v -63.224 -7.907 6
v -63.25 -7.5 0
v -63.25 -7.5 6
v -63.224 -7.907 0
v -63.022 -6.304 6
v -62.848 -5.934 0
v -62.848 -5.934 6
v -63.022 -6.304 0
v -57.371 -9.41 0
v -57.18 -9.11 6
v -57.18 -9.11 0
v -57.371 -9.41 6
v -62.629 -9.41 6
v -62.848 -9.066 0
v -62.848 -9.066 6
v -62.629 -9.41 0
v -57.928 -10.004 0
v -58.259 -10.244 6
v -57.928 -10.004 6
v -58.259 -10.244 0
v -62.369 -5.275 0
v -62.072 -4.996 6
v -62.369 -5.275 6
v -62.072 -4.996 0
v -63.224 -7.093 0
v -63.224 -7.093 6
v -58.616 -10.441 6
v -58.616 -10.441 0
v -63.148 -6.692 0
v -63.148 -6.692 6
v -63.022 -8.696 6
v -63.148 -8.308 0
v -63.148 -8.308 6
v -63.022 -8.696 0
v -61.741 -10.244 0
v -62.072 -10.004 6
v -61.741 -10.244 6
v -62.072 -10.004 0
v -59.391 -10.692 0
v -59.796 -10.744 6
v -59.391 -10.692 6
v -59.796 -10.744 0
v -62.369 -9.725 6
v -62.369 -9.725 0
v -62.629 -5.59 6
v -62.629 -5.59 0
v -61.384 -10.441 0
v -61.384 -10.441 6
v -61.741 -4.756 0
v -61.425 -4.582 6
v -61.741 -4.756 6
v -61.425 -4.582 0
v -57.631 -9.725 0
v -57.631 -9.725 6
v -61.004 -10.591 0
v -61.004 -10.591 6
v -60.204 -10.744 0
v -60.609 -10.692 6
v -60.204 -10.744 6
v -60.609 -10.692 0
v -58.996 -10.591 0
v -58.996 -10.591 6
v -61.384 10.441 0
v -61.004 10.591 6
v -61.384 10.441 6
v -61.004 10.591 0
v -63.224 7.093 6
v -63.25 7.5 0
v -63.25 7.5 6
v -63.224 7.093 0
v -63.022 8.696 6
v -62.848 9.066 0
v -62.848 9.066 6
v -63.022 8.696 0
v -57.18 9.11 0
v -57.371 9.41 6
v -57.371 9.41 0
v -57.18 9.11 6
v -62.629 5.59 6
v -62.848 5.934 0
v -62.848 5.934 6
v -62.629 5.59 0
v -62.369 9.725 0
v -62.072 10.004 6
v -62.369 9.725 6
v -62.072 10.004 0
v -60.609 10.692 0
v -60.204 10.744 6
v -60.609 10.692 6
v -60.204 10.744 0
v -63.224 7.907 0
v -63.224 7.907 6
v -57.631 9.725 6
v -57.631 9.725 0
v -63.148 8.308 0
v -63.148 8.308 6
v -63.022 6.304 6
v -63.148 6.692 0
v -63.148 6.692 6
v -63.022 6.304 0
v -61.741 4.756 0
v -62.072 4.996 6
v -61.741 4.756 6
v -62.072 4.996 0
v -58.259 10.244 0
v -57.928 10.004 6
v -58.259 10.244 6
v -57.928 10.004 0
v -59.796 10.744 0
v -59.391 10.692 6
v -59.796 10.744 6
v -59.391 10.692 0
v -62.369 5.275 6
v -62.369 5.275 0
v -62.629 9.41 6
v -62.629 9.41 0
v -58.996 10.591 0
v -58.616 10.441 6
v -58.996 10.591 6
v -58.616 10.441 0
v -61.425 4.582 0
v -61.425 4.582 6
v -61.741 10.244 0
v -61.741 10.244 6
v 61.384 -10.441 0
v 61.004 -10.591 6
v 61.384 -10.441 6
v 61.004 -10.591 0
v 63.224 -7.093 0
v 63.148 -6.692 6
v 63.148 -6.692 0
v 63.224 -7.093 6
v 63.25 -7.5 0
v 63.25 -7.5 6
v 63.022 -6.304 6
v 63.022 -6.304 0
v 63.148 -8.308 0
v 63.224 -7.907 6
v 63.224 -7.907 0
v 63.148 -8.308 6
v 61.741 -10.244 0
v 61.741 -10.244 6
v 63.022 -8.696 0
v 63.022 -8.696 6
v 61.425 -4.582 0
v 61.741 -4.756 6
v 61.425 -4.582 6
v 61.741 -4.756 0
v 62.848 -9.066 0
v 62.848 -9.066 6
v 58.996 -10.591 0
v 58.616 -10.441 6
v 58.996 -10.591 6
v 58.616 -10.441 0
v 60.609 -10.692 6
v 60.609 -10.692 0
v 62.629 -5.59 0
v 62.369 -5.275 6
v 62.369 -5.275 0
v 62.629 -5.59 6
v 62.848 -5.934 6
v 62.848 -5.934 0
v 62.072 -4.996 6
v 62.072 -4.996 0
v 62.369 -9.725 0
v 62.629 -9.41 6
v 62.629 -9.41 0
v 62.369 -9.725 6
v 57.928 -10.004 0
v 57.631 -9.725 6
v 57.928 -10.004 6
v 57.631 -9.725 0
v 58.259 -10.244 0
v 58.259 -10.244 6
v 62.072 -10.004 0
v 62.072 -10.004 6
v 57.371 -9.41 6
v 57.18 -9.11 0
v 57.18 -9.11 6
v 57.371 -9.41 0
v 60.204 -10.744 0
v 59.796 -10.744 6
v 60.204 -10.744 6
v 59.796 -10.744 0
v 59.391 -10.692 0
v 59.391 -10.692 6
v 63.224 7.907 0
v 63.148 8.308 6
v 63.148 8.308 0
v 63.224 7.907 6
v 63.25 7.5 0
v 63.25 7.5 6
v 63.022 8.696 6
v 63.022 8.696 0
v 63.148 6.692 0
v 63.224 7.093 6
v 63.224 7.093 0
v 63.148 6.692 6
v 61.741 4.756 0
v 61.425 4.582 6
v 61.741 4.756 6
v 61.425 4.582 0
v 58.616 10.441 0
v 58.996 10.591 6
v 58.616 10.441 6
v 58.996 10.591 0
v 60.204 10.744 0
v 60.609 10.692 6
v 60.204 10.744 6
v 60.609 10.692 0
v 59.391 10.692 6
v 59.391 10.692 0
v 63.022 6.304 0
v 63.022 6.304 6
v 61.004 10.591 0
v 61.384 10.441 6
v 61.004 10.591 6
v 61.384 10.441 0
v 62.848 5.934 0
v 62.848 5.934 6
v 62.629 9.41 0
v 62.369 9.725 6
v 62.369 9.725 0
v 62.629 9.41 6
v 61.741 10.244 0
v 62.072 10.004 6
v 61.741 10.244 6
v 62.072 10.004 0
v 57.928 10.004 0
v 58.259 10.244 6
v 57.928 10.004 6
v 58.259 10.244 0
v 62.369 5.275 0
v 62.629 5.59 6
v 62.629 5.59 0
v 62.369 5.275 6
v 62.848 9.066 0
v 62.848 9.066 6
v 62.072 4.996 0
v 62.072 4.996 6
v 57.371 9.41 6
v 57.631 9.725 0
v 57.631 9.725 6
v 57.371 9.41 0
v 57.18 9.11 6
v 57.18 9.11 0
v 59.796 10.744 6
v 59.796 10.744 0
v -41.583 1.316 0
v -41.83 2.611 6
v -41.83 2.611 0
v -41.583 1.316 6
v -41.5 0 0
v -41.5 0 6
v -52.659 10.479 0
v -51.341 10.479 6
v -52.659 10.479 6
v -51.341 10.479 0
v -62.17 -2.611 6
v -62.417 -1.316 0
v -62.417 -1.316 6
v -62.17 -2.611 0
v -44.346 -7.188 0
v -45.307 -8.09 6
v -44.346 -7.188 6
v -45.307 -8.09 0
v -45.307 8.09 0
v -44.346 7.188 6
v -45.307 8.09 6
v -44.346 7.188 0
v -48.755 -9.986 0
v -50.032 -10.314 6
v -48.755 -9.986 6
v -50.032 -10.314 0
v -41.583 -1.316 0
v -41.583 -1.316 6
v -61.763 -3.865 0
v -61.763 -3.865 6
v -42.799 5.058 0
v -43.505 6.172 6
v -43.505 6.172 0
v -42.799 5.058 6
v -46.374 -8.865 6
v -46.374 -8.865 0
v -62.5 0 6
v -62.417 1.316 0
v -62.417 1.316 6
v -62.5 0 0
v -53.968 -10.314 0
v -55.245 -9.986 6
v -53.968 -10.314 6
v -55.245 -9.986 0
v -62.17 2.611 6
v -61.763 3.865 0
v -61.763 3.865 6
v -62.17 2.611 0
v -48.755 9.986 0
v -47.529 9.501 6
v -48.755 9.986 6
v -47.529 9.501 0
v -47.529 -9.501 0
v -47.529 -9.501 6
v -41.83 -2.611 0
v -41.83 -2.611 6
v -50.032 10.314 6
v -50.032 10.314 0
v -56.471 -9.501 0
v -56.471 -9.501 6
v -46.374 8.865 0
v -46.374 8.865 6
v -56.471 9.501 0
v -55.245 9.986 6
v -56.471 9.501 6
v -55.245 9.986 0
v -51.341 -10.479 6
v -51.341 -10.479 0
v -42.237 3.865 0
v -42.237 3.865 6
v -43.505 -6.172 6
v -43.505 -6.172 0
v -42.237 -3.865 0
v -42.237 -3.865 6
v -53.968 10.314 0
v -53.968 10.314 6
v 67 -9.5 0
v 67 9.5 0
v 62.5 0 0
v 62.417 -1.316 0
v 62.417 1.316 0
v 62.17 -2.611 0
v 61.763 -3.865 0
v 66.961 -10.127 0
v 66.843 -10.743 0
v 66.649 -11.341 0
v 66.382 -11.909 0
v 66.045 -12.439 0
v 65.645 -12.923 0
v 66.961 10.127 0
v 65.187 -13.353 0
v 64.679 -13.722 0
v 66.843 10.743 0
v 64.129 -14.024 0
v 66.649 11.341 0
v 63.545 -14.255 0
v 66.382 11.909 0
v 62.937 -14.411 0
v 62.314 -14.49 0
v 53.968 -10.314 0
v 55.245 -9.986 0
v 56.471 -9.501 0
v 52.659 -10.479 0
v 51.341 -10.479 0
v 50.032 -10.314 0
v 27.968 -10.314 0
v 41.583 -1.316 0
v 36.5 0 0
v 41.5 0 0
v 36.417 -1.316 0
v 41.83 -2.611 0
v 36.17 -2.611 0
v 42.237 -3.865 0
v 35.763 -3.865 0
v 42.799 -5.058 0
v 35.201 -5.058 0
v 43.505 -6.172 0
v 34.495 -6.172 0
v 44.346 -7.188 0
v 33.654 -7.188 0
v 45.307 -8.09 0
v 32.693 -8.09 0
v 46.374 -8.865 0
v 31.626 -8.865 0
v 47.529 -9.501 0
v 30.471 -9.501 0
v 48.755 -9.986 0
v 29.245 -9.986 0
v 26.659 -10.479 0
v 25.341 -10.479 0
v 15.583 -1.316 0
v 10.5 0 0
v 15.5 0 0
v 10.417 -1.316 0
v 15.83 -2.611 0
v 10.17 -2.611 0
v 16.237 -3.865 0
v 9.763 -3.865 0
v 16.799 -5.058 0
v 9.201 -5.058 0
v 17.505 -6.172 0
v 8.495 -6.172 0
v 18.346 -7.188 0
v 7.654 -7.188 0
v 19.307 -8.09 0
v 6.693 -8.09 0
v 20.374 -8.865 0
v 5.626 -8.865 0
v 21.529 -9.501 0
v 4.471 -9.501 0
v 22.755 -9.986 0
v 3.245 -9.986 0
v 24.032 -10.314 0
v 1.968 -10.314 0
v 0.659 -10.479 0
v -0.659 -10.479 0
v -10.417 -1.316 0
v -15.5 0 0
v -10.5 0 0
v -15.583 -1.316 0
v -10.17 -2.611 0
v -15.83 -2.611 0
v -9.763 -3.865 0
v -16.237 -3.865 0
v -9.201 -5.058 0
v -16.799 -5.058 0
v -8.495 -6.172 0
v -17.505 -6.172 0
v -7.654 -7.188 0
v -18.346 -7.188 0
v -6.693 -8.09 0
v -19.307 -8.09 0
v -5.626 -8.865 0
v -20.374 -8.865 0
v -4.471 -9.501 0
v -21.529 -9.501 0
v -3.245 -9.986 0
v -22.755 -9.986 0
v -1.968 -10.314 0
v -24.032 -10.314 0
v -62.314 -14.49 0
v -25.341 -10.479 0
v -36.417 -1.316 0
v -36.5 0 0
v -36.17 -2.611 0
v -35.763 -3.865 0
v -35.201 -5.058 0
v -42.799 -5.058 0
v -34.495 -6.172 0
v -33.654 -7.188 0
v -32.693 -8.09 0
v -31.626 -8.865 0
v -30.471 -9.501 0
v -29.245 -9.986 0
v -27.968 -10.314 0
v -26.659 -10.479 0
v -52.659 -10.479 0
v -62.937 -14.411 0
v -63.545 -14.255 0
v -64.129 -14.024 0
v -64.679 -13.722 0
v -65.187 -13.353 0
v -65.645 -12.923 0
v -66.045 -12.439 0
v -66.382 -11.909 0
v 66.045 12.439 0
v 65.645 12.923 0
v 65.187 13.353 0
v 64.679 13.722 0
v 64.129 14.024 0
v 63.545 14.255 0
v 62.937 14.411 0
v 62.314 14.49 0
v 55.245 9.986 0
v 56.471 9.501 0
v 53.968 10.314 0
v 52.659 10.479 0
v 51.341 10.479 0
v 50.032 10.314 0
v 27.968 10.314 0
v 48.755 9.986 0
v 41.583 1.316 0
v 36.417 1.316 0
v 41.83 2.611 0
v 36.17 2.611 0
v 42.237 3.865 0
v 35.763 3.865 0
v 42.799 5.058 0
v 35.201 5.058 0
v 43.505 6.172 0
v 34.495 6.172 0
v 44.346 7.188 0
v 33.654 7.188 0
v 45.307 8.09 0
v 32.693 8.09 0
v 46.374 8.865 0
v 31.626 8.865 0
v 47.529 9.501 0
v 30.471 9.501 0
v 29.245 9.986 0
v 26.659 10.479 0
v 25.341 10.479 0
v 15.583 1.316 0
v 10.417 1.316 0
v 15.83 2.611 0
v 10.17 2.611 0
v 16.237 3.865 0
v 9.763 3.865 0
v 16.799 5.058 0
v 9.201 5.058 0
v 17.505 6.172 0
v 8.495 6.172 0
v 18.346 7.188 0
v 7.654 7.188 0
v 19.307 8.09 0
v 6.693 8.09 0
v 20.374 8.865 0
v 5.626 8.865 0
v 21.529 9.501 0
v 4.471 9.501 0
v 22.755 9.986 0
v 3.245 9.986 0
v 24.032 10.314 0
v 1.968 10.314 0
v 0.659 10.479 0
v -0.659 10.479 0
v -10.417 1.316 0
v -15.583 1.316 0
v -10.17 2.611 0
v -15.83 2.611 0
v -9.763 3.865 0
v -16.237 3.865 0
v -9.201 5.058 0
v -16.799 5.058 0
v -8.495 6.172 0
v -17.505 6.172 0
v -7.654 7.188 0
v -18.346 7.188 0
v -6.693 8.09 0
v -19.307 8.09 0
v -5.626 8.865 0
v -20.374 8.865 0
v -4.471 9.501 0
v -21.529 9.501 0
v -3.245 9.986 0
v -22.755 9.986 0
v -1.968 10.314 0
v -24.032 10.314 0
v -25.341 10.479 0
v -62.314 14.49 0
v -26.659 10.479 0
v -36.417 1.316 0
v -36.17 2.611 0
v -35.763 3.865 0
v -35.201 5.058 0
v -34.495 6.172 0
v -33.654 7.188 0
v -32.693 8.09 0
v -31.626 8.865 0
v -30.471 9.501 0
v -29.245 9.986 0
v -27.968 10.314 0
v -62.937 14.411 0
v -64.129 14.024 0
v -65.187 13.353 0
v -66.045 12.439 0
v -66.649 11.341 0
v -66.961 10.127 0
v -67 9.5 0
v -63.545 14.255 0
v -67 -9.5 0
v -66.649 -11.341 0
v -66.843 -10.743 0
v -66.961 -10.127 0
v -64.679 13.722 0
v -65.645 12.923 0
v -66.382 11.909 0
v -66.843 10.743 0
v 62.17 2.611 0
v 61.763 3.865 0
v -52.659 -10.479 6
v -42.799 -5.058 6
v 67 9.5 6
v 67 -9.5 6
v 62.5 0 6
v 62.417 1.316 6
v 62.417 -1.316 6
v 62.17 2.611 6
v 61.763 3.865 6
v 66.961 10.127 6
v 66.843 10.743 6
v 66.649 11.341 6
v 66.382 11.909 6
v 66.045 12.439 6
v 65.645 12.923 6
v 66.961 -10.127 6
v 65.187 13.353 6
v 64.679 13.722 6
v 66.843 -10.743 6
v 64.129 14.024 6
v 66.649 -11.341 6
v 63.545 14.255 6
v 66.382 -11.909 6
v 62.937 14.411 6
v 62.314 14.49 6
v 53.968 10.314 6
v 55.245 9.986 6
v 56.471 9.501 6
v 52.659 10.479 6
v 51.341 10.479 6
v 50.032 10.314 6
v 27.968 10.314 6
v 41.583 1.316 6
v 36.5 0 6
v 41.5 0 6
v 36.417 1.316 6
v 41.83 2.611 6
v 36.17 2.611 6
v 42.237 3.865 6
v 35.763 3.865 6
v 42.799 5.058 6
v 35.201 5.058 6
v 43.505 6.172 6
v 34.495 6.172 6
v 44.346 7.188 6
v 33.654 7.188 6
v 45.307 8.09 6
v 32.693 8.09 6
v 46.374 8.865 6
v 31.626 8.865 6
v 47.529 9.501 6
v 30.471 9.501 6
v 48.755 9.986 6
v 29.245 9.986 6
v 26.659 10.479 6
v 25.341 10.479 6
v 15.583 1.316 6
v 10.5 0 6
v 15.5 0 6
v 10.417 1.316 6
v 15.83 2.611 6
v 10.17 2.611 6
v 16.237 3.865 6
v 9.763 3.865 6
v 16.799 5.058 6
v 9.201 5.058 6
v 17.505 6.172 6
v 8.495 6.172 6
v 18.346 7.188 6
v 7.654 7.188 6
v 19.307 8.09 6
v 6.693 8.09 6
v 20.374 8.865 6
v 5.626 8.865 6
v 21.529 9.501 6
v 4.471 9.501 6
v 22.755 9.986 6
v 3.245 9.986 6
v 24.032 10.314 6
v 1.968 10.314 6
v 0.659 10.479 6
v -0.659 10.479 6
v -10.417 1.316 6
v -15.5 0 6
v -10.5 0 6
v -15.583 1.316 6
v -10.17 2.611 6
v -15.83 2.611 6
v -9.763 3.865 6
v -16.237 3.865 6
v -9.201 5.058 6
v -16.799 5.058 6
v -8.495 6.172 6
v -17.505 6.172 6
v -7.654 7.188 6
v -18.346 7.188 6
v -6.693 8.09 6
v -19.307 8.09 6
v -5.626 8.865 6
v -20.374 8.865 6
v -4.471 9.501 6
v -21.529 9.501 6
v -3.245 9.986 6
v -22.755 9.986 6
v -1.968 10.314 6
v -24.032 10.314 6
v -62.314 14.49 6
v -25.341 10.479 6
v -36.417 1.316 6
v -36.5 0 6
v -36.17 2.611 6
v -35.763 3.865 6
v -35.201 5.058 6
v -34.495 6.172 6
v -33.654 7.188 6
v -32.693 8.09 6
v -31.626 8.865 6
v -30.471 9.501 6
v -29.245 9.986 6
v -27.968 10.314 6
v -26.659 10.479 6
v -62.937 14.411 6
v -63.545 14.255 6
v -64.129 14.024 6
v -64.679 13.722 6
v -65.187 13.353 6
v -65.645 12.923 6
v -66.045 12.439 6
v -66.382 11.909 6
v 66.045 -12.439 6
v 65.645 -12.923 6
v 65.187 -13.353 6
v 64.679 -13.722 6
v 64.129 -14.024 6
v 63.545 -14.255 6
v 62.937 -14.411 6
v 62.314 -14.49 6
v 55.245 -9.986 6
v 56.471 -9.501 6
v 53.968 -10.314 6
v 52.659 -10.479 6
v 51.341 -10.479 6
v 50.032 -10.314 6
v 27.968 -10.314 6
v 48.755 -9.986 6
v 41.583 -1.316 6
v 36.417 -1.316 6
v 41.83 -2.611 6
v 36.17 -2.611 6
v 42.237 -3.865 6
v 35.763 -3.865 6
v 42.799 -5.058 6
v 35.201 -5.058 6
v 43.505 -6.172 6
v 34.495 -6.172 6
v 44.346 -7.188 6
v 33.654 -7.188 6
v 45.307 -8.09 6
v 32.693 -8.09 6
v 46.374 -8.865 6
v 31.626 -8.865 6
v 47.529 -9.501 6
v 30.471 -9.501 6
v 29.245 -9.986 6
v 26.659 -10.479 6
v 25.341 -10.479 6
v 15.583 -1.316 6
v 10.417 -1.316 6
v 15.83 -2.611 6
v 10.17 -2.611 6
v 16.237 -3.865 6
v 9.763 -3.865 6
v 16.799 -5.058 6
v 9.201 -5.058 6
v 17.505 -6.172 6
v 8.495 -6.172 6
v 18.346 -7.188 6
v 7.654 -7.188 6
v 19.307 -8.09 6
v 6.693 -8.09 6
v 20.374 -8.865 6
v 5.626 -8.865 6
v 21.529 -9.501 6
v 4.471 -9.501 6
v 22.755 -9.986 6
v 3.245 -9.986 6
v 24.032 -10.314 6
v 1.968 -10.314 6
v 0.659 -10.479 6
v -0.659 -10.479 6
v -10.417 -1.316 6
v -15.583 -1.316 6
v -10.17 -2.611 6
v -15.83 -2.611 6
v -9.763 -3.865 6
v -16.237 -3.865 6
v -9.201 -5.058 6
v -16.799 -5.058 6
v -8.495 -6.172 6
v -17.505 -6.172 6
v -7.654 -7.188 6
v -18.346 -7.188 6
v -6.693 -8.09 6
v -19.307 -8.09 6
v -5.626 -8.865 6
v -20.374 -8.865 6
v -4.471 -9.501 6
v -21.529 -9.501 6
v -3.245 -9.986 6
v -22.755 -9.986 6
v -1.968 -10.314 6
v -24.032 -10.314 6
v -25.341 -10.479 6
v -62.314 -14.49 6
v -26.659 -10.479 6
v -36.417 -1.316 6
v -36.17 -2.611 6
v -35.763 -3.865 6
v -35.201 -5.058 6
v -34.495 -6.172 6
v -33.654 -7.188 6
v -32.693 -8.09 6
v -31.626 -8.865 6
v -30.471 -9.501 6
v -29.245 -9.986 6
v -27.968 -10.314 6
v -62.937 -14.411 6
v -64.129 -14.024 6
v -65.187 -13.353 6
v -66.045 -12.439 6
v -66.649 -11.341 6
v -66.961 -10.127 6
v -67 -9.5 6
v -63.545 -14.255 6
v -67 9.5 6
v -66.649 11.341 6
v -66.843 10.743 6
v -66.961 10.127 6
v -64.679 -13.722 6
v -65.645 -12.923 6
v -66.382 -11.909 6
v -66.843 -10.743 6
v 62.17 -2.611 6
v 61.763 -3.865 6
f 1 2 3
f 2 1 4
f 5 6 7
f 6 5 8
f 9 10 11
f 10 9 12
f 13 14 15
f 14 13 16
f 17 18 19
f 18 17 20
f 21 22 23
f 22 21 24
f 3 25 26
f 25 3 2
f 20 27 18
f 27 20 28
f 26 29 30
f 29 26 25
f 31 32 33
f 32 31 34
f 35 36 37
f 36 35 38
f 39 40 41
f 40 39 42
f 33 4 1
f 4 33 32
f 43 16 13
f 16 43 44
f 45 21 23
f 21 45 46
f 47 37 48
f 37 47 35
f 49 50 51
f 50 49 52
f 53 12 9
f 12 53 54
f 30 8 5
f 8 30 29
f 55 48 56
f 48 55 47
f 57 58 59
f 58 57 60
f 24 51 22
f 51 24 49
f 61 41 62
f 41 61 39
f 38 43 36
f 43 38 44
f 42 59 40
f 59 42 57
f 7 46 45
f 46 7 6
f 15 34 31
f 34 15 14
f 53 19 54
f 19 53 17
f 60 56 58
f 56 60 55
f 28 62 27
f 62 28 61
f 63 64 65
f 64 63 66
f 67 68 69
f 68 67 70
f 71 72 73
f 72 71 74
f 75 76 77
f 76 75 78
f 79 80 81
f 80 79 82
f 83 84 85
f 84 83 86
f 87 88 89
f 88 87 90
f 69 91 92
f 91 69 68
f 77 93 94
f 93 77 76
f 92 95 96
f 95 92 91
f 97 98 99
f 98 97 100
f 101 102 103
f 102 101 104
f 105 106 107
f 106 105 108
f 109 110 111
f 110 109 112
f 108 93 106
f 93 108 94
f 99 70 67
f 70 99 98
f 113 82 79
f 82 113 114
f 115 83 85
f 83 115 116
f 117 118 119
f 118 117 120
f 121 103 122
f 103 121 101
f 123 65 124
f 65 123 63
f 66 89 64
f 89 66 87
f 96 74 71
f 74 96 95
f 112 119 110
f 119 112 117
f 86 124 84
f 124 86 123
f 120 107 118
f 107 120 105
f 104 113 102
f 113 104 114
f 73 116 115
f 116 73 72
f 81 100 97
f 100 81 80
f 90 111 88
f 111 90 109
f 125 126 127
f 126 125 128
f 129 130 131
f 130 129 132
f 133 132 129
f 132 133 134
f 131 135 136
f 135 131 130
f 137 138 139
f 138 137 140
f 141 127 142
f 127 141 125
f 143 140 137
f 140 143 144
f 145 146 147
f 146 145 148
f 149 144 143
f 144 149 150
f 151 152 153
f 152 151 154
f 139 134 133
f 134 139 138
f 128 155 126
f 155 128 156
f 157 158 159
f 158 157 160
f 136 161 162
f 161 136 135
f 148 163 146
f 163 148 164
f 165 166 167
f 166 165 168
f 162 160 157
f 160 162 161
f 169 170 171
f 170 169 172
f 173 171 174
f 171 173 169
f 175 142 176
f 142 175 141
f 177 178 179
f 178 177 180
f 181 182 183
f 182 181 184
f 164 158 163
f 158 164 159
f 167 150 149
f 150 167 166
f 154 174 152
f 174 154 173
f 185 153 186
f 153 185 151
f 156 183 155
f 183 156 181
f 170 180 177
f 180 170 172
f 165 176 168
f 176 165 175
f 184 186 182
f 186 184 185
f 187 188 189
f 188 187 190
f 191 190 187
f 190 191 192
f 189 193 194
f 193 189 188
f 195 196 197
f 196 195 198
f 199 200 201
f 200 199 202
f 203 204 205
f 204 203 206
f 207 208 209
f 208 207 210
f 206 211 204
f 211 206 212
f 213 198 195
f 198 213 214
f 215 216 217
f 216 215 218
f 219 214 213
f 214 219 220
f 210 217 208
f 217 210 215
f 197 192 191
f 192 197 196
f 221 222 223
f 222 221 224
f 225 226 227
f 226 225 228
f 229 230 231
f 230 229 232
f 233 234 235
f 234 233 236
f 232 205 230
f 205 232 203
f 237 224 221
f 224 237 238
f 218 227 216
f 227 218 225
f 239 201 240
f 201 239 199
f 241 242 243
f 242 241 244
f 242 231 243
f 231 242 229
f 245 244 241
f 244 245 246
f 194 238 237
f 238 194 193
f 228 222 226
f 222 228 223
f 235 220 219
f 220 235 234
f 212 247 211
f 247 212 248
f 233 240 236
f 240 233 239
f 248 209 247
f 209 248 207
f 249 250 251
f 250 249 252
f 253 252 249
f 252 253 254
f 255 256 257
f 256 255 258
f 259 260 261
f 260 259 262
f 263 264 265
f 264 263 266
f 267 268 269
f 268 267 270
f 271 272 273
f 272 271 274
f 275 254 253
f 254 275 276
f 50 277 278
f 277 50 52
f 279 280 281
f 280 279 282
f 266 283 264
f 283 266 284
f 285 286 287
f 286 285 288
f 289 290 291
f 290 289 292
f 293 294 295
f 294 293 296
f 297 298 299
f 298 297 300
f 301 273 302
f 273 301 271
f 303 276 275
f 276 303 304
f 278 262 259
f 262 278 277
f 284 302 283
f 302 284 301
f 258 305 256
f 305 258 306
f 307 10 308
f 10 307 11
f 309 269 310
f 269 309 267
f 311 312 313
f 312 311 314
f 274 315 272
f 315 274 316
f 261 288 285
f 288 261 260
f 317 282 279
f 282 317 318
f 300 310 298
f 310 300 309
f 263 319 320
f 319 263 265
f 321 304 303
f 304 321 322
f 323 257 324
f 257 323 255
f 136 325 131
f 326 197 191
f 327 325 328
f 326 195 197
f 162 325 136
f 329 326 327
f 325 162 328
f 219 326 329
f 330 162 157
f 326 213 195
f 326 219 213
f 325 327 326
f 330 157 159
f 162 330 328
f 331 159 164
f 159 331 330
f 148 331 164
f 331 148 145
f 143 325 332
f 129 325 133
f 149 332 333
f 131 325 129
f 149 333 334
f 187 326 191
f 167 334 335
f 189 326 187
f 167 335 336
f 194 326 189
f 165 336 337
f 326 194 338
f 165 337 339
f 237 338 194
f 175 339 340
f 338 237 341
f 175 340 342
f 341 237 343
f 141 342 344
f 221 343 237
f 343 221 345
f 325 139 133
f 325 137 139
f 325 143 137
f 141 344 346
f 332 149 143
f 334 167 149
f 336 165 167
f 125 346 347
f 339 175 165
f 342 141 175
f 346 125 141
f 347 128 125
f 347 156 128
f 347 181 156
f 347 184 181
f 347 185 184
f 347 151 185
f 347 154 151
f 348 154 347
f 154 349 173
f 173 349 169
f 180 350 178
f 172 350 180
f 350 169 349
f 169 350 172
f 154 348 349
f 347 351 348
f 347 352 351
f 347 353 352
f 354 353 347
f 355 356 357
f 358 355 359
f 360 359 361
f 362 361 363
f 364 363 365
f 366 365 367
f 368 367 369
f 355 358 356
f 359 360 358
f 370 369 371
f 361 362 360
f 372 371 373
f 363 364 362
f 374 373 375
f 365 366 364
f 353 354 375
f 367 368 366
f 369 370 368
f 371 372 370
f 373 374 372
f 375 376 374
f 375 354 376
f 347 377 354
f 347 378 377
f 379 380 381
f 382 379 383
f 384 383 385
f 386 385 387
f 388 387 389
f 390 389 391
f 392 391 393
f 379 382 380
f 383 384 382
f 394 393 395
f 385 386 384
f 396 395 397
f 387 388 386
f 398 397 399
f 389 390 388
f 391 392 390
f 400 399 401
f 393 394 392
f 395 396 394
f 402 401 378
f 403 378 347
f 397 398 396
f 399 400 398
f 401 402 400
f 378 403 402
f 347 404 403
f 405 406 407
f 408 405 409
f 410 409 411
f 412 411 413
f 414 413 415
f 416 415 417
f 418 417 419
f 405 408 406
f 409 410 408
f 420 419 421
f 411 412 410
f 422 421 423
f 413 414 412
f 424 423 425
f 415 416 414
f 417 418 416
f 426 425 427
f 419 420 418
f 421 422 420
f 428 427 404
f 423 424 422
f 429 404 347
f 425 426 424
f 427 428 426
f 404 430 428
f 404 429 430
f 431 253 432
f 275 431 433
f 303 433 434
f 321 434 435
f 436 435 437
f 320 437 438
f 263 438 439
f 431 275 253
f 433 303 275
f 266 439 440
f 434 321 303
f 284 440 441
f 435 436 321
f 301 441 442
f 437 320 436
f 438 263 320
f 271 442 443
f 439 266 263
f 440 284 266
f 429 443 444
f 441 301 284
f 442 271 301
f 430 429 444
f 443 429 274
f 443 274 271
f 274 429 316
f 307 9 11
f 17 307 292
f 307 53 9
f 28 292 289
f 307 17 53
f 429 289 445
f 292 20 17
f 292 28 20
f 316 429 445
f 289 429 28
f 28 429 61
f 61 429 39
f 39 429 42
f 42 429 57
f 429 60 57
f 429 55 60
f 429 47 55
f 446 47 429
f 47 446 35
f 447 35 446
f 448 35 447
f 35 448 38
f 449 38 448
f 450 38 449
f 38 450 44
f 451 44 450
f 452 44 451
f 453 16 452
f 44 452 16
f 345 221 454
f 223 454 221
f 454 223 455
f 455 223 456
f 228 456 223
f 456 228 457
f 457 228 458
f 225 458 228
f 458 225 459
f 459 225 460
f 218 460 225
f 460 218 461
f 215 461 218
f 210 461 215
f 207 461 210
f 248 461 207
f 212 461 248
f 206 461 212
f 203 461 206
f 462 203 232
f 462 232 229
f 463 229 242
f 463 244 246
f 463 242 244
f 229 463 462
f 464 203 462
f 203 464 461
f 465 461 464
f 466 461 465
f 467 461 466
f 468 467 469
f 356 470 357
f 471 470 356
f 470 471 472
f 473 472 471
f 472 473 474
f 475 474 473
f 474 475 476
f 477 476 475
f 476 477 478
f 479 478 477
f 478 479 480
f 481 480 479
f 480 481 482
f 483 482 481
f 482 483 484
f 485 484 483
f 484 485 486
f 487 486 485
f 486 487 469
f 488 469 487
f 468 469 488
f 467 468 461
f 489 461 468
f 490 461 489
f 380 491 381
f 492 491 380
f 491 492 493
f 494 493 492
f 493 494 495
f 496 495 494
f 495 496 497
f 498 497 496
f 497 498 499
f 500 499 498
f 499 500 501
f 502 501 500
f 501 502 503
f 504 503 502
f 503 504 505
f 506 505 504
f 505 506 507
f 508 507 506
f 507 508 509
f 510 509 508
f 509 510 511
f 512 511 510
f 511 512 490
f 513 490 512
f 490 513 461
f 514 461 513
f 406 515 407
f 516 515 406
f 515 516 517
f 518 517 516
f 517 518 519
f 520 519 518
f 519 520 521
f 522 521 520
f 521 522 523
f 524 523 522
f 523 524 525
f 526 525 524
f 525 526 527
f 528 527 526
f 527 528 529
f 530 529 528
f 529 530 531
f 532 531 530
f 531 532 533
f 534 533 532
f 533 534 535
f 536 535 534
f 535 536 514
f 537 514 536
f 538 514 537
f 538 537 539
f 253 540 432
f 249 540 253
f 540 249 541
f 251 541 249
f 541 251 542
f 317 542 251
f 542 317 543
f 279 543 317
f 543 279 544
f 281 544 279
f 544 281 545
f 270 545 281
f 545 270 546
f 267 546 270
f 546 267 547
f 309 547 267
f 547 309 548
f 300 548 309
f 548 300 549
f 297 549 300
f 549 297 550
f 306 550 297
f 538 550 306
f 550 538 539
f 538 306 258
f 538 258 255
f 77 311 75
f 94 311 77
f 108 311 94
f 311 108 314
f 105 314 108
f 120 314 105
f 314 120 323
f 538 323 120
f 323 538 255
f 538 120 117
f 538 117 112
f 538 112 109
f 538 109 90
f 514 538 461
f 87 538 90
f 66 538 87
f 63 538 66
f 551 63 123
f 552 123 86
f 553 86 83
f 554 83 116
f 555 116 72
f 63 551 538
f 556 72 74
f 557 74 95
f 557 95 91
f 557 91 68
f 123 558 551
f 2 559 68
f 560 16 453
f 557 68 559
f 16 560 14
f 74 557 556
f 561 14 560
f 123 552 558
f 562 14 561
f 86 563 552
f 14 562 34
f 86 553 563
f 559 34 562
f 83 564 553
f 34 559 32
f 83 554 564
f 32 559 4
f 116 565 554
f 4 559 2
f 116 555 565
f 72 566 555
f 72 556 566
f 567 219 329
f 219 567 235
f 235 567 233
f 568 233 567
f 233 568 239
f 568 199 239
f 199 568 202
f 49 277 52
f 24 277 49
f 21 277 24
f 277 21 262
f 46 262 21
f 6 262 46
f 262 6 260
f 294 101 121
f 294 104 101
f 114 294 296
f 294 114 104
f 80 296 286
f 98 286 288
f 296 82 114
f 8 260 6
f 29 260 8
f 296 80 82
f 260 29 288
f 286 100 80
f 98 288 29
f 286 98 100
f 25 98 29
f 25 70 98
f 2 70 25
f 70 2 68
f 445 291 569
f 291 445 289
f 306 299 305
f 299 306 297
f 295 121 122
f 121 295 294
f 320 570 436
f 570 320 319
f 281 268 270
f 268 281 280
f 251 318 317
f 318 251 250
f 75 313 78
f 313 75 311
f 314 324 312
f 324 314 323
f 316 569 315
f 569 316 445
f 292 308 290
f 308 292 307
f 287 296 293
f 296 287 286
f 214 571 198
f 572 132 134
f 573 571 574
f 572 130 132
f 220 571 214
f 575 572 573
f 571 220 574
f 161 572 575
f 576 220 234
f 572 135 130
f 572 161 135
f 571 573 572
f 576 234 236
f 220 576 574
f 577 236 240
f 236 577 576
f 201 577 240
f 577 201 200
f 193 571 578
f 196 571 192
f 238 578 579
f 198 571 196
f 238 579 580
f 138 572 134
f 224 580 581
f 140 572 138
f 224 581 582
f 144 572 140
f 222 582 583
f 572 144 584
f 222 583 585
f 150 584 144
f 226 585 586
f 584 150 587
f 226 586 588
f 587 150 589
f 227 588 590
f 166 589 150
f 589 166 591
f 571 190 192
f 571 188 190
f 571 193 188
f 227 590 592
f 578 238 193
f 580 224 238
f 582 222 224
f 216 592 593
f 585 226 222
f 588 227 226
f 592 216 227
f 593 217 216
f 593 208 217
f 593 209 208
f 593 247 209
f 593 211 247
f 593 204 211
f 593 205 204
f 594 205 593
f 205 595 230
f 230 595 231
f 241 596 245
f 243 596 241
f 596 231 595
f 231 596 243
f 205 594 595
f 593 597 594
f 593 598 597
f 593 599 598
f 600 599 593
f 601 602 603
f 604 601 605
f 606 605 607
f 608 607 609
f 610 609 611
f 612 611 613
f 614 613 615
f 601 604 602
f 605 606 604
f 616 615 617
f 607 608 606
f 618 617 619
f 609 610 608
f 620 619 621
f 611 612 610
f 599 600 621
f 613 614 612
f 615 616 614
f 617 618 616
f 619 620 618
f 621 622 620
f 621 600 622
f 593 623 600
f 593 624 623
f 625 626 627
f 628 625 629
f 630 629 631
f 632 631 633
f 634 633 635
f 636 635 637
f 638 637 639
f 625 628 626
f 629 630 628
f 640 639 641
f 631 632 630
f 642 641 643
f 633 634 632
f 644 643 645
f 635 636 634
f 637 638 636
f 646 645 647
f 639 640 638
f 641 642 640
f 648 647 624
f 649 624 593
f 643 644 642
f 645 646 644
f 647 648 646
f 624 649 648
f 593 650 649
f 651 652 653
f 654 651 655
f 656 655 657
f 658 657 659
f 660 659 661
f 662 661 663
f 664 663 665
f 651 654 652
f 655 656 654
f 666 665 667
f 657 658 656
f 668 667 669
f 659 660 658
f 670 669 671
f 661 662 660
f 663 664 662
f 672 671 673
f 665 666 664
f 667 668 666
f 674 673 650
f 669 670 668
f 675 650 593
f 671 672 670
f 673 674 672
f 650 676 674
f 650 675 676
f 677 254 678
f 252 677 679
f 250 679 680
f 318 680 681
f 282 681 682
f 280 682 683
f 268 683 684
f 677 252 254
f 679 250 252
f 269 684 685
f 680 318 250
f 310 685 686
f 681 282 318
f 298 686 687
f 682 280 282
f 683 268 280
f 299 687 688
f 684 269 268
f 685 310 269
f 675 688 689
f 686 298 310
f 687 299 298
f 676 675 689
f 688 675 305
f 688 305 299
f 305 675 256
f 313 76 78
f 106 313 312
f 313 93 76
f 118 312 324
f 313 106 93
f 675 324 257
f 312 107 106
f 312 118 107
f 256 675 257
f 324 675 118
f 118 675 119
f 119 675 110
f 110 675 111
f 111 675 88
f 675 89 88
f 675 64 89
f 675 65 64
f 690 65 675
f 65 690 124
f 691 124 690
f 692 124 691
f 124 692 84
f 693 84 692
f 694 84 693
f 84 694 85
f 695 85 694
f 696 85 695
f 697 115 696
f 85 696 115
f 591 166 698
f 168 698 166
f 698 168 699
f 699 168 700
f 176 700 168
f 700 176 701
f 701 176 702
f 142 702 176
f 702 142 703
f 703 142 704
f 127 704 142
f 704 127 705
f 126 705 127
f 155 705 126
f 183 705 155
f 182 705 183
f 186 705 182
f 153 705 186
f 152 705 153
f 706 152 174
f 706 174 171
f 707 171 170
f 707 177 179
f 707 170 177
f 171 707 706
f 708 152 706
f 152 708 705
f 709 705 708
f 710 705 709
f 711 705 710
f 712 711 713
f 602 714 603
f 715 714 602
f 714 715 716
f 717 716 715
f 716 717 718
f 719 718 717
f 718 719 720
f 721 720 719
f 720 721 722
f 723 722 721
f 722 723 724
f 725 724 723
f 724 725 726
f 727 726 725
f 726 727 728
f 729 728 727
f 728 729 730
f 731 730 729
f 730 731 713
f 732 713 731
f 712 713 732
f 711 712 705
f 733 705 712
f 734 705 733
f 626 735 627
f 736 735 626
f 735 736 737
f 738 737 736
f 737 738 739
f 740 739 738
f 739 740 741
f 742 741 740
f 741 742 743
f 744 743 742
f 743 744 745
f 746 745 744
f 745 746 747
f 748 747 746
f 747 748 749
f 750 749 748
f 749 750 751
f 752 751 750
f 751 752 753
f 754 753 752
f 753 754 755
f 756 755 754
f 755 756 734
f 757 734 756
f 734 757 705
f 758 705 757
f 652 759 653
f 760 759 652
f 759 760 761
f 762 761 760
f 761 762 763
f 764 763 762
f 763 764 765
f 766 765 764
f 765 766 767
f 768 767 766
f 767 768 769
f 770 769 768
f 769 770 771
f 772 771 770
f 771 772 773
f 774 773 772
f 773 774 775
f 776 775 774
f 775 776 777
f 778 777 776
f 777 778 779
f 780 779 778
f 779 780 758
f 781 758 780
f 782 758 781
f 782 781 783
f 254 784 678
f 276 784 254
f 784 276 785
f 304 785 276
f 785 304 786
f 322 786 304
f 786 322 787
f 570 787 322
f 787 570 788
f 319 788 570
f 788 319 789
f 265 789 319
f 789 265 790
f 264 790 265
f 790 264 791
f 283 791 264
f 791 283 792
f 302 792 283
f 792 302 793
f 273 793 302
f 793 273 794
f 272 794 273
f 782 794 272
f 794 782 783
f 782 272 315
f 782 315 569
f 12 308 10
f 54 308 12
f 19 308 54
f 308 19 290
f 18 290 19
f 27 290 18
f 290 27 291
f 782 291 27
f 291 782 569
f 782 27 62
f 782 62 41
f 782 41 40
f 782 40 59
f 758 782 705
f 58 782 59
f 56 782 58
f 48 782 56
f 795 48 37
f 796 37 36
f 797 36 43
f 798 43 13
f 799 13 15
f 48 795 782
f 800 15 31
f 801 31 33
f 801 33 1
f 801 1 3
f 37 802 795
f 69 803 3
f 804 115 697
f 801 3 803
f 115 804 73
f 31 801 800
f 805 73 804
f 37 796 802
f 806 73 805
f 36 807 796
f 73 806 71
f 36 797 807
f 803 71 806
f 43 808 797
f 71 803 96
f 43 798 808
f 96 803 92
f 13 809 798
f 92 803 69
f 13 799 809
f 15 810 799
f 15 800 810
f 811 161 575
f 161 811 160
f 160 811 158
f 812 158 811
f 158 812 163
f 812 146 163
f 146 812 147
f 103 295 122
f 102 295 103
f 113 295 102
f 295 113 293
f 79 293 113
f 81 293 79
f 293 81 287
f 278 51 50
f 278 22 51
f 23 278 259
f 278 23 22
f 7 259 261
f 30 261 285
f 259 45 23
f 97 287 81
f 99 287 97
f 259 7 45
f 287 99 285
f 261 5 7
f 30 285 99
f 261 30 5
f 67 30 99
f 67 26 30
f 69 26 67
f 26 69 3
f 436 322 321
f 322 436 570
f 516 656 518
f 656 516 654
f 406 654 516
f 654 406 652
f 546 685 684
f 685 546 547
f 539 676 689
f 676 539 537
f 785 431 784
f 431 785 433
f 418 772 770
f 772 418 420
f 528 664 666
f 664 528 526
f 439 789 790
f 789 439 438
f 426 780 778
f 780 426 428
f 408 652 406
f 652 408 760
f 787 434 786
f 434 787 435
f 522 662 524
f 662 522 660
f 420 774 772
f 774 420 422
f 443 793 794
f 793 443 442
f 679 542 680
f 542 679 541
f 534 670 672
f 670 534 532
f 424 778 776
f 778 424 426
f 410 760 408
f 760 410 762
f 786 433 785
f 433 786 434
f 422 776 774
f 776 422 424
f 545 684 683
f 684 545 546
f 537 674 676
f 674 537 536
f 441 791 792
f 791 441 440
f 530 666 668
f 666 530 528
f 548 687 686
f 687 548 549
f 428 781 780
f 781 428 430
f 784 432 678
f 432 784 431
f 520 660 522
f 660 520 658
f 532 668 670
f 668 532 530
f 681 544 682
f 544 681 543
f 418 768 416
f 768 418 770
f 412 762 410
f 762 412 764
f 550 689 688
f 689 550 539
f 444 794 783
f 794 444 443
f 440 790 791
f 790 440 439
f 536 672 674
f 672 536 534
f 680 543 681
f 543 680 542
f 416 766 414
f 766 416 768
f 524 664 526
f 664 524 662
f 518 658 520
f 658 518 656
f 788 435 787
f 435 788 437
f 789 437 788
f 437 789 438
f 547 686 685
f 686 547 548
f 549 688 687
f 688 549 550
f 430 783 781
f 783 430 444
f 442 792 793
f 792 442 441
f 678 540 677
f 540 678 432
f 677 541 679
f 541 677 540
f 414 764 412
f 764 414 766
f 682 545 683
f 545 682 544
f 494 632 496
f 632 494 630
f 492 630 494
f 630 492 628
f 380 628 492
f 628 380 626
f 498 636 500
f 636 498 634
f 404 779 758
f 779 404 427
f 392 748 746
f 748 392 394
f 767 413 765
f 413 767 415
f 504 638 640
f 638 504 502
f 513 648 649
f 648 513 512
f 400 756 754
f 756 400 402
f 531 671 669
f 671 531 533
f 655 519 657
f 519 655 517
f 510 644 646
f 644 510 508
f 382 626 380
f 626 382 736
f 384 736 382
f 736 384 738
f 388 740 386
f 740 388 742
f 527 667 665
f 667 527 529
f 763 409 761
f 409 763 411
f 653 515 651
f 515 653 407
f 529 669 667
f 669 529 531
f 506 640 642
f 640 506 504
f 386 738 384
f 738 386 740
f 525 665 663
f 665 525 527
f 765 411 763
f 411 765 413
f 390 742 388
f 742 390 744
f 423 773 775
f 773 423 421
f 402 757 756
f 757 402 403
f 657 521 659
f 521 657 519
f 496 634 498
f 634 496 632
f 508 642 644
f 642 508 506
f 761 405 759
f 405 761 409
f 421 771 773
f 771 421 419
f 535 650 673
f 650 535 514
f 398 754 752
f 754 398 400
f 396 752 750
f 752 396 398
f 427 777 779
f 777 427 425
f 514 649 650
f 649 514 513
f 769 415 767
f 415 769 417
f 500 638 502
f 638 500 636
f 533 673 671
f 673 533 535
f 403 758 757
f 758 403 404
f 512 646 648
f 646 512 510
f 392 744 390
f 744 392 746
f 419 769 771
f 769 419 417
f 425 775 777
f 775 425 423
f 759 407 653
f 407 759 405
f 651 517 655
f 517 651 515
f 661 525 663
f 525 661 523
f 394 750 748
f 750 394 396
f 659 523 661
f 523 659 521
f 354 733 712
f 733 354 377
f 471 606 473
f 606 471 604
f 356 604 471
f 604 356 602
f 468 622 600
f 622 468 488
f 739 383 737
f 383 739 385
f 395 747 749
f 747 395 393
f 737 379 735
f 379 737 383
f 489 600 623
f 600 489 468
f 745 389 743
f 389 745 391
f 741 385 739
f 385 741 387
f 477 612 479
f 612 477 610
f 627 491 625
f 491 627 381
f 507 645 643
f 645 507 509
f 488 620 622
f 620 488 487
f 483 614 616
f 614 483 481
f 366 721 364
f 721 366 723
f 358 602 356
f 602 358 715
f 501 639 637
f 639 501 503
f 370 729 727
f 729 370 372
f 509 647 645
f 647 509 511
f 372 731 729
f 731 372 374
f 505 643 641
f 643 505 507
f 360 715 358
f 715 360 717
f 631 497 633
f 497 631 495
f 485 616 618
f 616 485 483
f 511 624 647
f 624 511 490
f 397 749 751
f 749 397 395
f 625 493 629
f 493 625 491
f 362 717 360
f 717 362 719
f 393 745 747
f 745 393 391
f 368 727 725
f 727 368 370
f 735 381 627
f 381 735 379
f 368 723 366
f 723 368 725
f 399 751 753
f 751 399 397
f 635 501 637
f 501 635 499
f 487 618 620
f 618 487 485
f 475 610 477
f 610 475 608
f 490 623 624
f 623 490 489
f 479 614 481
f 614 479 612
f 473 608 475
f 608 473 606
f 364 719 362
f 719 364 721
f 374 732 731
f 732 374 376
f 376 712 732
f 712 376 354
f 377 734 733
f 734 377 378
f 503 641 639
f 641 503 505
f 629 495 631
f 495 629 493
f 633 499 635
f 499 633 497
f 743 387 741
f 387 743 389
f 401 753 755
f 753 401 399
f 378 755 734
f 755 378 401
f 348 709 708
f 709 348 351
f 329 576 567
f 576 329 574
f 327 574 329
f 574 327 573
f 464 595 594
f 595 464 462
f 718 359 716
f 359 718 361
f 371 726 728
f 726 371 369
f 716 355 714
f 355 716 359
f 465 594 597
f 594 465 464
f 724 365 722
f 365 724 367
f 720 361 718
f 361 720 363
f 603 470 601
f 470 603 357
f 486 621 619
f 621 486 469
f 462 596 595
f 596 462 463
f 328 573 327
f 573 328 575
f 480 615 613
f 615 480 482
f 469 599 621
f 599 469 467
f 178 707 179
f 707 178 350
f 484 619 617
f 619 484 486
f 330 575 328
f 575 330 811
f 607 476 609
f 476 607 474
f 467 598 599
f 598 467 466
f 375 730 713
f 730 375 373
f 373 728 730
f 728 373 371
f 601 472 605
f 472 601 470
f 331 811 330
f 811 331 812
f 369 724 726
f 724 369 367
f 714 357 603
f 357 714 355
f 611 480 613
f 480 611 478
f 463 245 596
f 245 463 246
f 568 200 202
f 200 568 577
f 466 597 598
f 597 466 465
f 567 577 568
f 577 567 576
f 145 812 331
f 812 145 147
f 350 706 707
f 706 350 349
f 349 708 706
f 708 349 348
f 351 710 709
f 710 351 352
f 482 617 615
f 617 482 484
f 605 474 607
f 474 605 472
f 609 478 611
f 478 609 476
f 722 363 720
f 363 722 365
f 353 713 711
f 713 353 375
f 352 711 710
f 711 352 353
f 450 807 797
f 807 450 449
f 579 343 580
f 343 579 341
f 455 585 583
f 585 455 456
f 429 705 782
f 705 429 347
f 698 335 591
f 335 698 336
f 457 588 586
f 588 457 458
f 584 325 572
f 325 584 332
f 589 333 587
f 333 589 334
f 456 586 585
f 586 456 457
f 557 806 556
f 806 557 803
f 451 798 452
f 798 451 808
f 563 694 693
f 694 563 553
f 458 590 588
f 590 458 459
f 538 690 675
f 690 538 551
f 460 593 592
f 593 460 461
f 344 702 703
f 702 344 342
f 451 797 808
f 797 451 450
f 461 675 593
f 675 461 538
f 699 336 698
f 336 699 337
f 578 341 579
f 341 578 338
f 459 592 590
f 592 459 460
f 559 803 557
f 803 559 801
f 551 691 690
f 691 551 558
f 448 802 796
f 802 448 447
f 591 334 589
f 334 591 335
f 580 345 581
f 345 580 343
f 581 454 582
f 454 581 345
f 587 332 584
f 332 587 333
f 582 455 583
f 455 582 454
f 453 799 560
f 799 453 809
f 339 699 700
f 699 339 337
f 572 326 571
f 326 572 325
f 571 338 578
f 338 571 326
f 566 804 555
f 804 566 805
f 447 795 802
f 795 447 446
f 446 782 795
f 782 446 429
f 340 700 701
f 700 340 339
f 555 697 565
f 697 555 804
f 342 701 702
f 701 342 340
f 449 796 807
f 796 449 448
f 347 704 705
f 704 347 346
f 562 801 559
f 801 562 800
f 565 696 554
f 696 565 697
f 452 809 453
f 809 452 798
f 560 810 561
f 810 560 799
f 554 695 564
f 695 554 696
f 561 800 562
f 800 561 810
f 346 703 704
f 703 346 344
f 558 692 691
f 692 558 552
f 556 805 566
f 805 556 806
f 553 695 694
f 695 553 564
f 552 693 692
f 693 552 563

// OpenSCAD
$fn = 50;

difference() {
	union() {
		hull() {
			translate(v = [-62.0, 9.5, 0]) {
				cylinder(h = 6, r = 5);
			}
			translate(v = [62.0, 9.5, 0]) {
				cylinder(h = 6, r = 5);
			}
			translate(v = [-62.0, -9.5, 0]) {
				cylinder(h = 6, r = 5);
			}
			translate(v = [62.0, -9.5, 0]) {
				cylinder(h = 6, r = 5);
			}
		}
	}
	union() {
		translate(v = [-60.0, -7.5, -100.0]) {
			cylinder(h = 200, r = 3.25);
		}
		translate(v = [-60.0, 7.5, -100.0]) {
			cylinder(h = 200, r = 3.25);
		}
		translate(v = [60.0, -7.5, -100.0]) {
			cylinder(h = 200, r = 3.25);
		}
		translate(v = [60.0, 7.5, -100.0]) {
			cylinder(h = 200, r = 3.25);
		}
		translate(v = [-60.0, -7.5, -100.0]) {
			cylinder(h = 200, r = 1.8);
		}
		translate(v = [-60.0, 7.5, -100.0]) {
			cylinder(h = 200, r = 1.8);
		}
		translate(v = [60.0, -7.5, -100.0]) {
			cylinder(h = 200, r = 1.8);
		}
		translate(v = [60.0, 7.5, -100.0]) {
			cylinder(h = 200, r = 1.8);
		}
		translate(v = [-52.0, 0, 0.0]) {
			cylinder(h = 6, r = 10.5);
		}
		translate(v = [-26.0, 0, 0.0]) {
			cylinder(h = 6, r = 10.5);
		}
		cylinder(h = 6, r = 10.5);
		translate(v = [26.0, 0, 0.0]) {
			cylinder(h = 6, r = 10.5);
		}
		translate(v = [52.0, 0, 0.0]) {
			cylinder(h = 6, r = 10.5);
		}
	}
}
